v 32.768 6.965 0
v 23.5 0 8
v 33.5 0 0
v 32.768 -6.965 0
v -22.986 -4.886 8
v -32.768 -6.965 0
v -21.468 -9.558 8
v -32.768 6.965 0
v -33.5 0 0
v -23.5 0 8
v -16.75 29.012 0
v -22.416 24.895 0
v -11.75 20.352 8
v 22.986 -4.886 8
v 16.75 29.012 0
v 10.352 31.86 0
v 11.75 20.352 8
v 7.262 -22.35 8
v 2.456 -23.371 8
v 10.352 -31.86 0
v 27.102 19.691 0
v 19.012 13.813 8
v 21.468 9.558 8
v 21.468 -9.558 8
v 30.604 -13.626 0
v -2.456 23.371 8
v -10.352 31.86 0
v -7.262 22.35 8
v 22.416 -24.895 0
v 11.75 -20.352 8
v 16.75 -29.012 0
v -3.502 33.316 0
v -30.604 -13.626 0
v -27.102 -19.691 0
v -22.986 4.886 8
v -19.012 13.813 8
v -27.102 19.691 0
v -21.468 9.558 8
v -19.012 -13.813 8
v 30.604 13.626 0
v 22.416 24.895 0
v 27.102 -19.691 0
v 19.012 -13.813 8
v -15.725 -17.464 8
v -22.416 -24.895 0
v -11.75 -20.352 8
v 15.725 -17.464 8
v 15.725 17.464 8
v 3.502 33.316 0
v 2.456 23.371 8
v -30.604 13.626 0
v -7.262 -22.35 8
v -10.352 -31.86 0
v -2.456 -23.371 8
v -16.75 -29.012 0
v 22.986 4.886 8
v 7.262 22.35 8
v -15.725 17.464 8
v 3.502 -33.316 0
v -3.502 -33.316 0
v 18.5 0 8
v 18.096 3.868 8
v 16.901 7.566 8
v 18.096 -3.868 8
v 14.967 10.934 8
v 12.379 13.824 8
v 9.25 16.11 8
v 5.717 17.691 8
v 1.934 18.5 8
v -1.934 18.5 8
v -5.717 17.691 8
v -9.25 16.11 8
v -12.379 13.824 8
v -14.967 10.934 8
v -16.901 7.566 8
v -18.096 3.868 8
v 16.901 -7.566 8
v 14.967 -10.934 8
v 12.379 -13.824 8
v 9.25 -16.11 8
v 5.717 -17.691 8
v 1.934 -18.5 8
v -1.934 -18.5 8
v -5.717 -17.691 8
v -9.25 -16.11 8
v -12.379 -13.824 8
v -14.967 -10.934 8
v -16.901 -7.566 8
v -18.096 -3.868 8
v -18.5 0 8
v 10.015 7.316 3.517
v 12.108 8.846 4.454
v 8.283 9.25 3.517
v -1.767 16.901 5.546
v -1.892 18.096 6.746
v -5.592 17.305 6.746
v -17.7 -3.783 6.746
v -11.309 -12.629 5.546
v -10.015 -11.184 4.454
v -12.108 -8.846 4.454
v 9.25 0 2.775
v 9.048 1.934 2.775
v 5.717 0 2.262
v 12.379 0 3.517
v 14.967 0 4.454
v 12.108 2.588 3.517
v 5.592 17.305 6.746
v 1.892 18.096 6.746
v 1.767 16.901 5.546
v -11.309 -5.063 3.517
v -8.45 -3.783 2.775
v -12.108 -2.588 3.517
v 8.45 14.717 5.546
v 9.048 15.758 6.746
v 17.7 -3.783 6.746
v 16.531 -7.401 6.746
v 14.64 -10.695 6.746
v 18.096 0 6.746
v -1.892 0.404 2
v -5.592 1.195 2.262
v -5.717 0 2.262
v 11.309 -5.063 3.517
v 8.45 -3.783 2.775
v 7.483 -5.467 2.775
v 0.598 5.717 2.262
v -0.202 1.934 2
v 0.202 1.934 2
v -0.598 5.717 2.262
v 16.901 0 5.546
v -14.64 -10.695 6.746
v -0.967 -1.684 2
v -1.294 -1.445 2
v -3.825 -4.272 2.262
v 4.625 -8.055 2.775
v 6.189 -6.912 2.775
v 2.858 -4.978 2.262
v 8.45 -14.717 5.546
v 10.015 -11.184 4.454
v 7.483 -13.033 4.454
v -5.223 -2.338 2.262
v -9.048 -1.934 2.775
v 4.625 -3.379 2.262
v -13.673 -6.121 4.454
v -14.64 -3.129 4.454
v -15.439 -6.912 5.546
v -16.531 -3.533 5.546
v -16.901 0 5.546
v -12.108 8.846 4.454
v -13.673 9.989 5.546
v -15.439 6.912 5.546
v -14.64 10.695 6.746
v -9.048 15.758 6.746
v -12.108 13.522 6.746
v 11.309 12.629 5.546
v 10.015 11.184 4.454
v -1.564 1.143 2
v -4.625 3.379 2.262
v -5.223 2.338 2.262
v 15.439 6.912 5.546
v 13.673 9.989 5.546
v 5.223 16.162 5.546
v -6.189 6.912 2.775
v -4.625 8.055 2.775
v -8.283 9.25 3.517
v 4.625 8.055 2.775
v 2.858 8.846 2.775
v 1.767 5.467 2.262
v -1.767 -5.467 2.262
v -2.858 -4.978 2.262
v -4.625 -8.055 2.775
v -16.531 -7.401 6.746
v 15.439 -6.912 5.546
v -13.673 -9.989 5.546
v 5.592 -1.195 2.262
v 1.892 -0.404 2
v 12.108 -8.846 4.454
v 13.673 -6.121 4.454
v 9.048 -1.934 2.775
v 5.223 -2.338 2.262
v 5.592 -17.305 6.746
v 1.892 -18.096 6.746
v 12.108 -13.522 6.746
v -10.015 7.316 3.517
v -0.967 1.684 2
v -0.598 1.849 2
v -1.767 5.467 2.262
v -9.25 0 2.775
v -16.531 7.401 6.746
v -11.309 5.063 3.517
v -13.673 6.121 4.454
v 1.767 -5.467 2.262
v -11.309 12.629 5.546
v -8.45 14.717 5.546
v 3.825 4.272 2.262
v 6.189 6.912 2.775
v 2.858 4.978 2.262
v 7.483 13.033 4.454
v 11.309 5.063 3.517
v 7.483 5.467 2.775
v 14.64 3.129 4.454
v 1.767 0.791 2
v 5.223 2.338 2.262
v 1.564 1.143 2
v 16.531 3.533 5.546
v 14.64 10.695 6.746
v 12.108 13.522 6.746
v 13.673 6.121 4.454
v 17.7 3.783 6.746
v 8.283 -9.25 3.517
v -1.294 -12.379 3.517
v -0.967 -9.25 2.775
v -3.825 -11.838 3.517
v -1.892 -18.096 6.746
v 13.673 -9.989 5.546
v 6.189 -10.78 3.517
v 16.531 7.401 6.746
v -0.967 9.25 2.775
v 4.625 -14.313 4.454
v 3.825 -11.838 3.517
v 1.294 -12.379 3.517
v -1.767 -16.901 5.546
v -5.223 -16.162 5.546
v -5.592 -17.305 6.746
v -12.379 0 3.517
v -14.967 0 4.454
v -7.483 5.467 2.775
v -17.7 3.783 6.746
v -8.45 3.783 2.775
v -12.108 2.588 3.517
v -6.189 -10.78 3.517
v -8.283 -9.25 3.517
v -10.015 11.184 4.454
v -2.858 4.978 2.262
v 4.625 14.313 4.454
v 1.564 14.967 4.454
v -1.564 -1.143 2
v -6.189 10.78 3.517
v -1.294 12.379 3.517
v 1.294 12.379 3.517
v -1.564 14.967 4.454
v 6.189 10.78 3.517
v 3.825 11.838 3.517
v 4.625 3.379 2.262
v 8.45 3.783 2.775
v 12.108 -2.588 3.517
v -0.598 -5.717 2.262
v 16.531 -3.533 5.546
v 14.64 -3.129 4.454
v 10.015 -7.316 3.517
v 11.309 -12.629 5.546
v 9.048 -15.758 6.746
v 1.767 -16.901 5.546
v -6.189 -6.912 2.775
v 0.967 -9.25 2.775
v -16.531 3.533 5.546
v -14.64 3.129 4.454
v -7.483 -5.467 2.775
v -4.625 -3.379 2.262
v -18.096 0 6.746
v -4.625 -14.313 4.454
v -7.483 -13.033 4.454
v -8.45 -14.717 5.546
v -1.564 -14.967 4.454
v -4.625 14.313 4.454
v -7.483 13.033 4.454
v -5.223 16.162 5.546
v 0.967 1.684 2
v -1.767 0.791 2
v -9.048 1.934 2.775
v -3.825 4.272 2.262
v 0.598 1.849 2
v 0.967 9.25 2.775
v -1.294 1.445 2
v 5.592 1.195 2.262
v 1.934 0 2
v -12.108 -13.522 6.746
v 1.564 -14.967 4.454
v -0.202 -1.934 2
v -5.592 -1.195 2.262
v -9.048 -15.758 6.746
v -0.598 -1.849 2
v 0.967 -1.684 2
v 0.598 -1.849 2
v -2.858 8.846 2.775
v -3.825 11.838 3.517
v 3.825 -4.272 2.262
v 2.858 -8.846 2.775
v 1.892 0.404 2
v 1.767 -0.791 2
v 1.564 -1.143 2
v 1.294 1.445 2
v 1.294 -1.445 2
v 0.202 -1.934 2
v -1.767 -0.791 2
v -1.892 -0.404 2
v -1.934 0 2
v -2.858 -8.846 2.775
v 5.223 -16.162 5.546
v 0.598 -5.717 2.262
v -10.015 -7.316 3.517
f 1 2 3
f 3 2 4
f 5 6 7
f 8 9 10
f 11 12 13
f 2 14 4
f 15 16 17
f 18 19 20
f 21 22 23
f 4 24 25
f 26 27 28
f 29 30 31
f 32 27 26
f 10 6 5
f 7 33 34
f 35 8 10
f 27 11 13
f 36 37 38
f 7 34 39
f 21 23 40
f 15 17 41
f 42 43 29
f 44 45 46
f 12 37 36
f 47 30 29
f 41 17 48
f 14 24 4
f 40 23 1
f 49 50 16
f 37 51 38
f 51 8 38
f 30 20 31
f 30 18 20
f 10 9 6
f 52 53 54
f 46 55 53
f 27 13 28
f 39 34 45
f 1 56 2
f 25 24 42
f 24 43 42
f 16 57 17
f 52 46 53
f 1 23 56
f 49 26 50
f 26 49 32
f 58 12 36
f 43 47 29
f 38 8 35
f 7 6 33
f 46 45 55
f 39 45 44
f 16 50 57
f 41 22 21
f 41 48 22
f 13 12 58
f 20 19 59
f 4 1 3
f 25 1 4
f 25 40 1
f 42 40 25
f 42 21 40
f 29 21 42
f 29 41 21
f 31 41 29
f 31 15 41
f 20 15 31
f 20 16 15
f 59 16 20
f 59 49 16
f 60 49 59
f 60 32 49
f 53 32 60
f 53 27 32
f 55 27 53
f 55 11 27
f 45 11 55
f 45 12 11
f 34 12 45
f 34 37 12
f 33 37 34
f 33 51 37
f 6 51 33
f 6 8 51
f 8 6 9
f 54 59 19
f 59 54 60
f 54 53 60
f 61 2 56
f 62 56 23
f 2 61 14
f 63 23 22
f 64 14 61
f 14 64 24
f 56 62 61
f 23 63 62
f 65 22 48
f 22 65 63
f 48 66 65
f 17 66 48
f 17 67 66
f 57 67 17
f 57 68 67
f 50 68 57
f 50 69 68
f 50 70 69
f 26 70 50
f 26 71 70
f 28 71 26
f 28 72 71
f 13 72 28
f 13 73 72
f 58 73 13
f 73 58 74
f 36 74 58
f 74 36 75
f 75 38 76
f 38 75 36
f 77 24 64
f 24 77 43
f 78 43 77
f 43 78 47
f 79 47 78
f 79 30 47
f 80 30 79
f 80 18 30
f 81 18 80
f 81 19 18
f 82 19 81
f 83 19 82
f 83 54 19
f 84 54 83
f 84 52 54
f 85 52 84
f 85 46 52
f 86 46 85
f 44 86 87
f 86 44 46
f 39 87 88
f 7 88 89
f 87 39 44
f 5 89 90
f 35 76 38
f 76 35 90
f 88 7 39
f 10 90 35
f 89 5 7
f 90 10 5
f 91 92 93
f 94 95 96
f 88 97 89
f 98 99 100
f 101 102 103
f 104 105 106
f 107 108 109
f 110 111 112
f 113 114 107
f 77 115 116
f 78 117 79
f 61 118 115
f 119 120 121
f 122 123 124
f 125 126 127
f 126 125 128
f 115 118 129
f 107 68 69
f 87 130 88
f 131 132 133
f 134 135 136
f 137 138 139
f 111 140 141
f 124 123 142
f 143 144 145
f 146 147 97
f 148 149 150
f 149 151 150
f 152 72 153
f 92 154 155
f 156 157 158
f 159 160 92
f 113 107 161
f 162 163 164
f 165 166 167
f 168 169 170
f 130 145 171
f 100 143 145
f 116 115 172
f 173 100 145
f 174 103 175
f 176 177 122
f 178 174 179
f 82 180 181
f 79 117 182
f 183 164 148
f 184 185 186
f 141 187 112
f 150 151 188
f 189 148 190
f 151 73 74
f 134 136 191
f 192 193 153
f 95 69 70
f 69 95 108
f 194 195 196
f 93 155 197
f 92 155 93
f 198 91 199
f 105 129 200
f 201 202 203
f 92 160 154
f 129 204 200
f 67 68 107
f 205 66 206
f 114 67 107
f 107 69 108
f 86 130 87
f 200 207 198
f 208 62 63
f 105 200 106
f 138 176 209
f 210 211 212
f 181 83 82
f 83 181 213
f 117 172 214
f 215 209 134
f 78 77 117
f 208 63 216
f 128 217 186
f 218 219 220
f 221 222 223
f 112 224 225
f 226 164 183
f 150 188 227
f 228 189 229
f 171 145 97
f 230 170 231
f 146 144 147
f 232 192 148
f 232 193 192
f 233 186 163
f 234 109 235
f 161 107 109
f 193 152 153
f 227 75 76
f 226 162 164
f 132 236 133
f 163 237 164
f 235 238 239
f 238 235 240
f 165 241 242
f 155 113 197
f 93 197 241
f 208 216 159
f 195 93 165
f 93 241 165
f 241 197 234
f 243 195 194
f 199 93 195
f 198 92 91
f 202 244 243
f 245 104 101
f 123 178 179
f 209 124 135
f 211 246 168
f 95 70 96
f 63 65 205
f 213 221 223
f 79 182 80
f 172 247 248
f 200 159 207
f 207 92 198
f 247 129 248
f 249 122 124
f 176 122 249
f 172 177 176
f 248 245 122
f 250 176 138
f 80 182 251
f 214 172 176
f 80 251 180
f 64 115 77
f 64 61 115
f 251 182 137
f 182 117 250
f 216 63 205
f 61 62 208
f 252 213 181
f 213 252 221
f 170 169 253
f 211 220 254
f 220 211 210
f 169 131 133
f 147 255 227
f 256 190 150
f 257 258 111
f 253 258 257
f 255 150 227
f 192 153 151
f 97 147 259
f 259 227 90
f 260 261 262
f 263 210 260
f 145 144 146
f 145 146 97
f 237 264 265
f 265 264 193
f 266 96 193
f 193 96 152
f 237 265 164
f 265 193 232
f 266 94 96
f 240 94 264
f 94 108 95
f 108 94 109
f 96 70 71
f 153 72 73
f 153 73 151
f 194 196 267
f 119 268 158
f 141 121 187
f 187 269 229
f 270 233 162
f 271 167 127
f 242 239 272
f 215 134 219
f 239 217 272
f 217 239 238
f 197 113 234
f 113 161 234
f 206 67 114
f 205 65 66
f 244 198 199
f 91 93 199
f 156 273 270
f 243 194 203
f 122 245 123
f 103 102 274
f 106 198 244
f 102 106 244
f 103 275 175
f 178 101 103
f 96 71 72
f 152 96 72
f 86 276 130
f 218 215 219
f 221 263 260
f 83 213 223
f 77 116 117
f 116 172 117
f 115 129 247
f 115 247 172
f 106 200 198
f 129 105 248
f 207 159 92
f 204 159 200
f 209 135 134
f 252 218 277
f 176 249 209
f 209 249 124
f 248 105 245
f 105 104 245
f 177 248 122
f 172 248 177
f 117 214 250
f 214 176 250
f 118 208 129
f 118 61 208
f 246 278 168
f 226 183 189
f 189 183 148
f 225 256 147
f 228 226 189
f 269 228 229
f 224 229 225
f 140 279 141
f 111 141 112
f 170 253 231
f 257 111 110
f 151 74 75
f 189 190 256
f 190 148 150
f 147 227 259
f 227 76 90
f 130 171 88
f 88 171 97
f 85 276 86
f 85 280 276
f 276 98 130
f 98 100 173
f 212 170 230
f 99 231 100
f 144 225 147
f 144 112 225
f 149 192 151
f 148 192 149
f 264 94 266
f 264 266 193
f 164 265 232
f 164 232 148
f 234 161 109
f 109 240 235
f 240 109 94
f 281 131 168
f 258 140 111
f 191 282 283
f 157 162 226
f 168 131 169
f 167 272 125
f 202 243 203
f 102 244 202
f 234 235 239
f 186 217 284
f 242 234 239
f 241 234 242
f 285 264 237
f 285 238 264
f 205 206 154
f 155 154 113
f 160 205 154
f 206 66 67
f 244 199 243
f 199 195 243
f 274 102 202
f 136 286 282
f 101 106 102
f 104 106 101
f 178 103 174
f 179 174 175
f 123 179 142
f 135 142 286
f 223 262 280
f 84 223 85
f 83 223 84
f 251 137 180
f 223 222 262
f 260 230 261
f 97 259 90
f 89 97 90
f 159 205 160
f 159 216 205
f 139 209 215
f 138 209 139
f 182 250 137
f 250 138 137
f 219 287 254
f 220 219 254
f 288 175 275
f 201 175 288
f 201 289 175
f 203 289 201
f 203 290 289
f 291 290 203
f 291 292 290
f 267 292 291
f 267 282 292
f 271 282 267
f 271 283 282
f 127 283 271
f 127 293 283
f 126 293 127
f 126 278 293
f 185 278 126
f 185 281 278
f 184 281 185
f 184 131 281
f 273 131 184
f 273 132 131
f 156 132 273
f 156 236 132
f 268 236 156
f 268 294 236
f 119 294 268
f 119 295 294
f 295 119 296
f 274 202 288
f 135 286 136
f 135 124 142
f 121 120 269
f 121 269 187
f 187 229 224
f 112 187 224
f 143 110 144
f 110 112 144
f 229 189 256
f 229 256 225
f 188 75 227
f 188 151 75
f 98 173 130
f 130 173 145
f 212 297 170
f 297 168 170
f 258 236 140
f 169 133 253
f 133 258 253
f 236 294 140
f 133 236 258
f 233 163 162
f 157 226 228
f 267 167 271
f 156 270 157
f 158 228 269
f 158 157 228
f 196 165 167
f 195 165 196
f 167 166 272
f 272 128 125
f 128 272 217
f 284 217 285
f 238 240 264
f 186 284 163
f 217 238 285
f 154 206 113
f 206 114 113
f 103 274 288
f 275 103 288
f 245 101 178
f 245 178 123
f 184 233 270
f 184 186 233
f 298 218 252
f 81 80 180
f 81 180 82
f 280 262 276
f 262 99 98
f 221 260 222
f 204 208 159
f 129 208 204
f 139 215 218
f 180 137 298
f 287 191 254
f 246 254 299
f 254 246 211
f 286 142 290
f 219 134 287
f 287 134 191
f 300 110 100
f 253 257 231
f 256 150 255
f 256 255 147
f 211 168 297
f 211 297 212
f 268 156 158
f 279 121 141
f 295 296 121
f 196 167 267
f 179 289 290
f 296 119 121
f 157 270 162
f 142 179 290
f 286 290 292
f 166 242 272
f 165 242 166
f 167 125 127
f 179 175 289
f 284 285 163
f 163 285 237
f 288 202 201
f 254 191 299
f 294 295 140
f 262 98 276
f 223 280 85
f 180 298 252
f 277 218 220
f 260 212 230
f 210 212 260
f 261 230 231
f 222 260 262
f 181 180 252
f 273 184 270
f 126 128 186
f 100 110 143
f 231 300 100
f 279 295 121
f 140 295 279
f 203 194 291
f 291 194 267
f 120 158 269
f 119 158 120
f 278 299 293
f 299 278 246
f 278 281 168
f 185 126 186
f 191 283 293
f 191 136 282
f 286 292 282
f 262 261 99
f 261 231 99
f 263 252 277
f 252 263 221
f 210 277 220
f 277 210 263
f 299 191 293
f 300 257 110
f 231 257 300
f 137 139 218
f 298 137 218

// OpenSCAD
// Height of the ant trap:
height = 8;

// Width of the ant trap:
diameter = 67;

// How wide should the lip be?
lip_width = 5;

// How much material under the lowest point of the dish?
min_bottom = 2;

// How much wider is the base than the top of the dish?
base_enlargement = 10;

difference()
{

    // base of trap:
    translate([ 0, 0, height / 2 ])
        cylinder(h = height, r1 = diameter / 2, r2 = diameter / 2 - base_enlargement, center = true);

    // Poison well:
    translate([ 0, 0, height ]) resize(newsize = [
        diameter - ((lip_width + base_enlargement) * 2), diameter - ((lip_width + base_enlargement) * 2),
        (height * 2) - (min_bottom * 2)
    ]) sphere(r = 10);
}
